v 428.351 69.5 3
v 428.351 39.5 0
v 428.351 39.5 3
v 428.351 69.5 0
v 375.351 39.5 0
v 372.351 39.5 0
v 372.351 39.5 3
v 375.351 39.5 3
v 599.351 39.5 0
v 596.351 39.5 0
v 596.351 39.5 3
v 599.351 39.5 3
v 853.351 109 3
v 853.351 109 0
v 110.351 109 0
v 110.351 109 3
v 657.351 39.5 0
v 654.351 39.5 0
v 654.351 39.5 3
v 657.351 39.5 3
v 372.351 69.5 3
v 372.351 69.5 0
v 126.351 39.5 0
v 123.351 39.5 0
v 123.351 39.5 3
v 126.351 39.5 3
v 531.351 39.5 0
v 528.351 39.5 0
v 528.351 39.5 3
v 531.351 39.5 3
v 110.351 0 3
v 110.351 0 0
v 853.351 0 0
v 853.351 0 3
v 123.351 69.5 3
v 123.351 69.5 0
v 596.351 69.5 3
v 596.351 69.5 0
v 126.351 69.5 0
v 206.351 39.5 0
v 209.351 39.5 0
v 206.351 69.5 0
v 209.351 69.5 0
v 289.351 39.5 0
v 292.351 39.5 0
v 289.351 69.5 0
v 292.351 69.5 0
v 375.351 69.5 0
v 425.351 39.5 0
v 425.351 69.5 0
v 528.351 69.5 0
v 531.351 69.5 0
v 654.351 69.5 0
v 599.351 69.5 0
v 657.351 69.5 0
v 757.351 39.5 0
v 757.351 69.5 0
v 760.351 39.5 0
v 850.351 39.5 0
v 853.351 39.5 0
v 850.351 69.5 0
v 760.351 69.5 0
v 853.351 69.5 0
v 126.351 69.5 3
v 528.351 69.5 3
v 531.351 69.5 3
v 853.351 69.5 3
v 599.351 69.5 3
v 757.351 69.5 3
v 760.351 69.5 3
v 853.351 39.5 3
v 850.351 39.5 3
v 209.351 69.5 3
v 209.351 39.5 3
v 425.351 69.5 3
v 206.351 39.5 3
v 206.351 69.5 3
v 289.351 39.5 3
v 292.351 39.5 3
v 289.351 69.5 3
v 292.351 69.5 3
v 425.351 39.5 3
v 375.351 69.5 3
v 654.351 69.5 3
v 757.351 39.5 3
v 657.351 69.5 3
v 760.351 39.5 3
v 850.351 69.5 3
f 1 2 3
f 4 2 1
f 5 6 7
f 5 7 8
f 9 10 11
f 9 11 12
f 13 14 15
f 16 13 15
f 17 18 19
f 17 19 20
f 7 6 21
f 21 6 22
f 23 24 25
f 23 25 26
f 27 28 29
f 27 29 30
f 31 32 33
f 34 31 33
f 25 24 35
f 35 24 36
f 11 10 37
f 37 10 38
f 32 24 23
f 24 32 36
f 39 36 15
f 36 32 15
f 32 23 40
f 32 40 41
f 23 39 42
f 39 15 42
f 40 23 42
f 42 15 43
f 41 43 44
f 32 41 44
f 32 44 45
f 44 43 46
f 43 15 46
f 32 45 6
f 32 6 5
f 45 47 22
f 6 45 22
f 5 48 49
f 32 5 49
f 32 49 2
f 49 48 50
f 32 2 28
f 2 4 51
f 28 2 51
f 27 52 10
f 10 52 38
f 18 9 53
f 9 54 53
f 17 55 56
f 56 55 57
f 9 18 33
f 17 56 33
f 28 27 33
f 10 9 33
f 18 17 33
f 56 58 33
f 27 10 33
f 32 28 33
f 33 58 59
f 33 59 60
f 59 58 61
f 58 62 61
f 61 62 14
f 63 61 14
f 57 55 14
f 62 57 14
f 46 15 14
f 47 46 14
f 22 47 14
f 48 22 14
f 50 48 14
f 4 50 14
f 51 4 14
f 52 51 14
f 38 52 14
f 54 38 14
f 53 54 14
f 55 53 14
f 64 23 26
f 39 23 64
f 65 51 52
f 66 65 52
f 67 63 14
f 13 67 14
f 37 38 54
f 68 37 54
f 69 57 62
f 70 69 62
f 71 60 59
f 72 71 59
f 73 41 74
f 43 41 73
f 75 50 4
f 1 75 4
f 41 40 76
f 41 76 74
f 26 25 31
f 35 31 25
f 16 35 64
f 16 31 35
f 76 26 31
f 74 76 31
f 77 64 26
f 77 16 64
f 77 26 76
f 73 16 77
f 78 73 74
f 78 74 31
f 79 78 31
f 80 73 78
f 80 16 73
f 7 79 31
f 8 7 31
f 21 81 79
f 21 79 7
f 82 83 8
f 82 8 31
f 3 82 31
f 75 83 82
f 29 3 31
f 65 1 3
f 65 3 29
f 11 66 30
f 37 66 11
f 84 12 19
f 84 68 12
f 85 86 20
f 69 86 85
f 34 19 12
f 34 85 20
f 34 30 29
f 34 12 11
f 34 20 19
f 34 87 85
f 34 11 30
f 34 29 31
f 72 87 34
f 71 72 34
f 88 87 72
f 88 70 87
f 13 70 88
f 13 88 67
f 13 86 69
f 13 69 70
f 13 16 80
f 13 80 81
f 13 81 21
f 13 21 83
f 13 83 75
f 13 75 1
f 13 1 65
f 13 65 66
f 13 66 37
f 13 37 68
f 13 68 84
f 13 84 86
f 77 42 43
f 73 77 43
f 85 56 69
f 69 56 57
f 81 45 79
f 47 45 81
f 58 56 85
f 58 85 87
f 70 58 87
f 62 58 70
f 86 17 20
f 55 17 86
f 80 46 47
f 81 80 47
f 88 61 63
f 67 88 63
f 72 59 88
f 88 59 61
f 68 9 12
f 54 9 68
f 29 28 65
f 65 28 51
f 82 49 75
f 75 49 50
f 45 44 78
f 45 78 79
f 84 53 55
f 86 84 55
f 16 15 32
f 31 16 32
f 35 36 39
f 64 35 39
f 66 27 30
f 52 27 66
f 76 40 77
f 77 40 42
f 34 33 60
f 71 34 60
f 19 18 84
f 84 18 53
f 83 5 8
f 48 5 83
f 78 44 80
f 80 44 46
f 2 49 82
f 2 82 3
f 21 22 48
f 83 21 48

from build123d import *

# Parameters (mm, degrees)
SKETCH1_W           = 3
SKETCH1_H           = 30
BOSS_EXTRUDE1_DEPTH = 3


with BuildPart() as part:
    # Sketch1 → Boss-Extrude1 (new body)
    with BuildSketch(Plane.XY):
        Polygon((853.35106383, 109), (110.35106383, 109), (110.35106383, 0), (853.35106383, 0), (853.35106383, 39.5), (850.35106383, 39.5), (850.35106383, 69.5), (853.35106383, 69.5), align=None)
        with Locations((124.85106383, 54.5)):
            Rectangle(SKETCH1_W, SKETCH1_H, mode=Mode.SUBTRACT)
        with Locations((207.85106383, 54.5)):
            Rectangle(SKETCH1_W, SKETCH1_H, mode=Mode.SUBTRACT)
        with Locations((290.85106383, 54.5)):
            Rectangle(SKETCH1_W, SKETCH1_H, mode=Mode.SUBTRACT)
        with Locations((373.85106383, 54.5)):
            Rectangle(SKETCH1_W, SKETCH1_H, mode=Mode.SUBTRACT)
        with Locations((426.85106383, 54.5)):
            Rectangle(SKETCH1_W, SKETCH1_H, mode=Mode.SUBTRACT)
        with Locations((529.85106383, 54.5)):
            Rectangle(SKETCH1_W, SKETCH1_H, mode=Mode.SUBTRACT)
        with Locations((597.85106383, 54.5)):
            Rectangle(SKETCH1_W, SKETCH1_H, mode=Mode.SUBTRACT)
        with Locations((655.85106383, 54.5)):
            Rectangle(SKETCH1_W, SKETCH1_H, mode=Mode.SUBTRACT)
        with Locations((758.85106383, 54.5)):
            Rectangle(SKETCH1_W, SKETCH1_H, mode=Mode.SUBTRACT)
    extrude(amount=BOSS_EXTRUDE1_DEPTH)


solid = part.part
